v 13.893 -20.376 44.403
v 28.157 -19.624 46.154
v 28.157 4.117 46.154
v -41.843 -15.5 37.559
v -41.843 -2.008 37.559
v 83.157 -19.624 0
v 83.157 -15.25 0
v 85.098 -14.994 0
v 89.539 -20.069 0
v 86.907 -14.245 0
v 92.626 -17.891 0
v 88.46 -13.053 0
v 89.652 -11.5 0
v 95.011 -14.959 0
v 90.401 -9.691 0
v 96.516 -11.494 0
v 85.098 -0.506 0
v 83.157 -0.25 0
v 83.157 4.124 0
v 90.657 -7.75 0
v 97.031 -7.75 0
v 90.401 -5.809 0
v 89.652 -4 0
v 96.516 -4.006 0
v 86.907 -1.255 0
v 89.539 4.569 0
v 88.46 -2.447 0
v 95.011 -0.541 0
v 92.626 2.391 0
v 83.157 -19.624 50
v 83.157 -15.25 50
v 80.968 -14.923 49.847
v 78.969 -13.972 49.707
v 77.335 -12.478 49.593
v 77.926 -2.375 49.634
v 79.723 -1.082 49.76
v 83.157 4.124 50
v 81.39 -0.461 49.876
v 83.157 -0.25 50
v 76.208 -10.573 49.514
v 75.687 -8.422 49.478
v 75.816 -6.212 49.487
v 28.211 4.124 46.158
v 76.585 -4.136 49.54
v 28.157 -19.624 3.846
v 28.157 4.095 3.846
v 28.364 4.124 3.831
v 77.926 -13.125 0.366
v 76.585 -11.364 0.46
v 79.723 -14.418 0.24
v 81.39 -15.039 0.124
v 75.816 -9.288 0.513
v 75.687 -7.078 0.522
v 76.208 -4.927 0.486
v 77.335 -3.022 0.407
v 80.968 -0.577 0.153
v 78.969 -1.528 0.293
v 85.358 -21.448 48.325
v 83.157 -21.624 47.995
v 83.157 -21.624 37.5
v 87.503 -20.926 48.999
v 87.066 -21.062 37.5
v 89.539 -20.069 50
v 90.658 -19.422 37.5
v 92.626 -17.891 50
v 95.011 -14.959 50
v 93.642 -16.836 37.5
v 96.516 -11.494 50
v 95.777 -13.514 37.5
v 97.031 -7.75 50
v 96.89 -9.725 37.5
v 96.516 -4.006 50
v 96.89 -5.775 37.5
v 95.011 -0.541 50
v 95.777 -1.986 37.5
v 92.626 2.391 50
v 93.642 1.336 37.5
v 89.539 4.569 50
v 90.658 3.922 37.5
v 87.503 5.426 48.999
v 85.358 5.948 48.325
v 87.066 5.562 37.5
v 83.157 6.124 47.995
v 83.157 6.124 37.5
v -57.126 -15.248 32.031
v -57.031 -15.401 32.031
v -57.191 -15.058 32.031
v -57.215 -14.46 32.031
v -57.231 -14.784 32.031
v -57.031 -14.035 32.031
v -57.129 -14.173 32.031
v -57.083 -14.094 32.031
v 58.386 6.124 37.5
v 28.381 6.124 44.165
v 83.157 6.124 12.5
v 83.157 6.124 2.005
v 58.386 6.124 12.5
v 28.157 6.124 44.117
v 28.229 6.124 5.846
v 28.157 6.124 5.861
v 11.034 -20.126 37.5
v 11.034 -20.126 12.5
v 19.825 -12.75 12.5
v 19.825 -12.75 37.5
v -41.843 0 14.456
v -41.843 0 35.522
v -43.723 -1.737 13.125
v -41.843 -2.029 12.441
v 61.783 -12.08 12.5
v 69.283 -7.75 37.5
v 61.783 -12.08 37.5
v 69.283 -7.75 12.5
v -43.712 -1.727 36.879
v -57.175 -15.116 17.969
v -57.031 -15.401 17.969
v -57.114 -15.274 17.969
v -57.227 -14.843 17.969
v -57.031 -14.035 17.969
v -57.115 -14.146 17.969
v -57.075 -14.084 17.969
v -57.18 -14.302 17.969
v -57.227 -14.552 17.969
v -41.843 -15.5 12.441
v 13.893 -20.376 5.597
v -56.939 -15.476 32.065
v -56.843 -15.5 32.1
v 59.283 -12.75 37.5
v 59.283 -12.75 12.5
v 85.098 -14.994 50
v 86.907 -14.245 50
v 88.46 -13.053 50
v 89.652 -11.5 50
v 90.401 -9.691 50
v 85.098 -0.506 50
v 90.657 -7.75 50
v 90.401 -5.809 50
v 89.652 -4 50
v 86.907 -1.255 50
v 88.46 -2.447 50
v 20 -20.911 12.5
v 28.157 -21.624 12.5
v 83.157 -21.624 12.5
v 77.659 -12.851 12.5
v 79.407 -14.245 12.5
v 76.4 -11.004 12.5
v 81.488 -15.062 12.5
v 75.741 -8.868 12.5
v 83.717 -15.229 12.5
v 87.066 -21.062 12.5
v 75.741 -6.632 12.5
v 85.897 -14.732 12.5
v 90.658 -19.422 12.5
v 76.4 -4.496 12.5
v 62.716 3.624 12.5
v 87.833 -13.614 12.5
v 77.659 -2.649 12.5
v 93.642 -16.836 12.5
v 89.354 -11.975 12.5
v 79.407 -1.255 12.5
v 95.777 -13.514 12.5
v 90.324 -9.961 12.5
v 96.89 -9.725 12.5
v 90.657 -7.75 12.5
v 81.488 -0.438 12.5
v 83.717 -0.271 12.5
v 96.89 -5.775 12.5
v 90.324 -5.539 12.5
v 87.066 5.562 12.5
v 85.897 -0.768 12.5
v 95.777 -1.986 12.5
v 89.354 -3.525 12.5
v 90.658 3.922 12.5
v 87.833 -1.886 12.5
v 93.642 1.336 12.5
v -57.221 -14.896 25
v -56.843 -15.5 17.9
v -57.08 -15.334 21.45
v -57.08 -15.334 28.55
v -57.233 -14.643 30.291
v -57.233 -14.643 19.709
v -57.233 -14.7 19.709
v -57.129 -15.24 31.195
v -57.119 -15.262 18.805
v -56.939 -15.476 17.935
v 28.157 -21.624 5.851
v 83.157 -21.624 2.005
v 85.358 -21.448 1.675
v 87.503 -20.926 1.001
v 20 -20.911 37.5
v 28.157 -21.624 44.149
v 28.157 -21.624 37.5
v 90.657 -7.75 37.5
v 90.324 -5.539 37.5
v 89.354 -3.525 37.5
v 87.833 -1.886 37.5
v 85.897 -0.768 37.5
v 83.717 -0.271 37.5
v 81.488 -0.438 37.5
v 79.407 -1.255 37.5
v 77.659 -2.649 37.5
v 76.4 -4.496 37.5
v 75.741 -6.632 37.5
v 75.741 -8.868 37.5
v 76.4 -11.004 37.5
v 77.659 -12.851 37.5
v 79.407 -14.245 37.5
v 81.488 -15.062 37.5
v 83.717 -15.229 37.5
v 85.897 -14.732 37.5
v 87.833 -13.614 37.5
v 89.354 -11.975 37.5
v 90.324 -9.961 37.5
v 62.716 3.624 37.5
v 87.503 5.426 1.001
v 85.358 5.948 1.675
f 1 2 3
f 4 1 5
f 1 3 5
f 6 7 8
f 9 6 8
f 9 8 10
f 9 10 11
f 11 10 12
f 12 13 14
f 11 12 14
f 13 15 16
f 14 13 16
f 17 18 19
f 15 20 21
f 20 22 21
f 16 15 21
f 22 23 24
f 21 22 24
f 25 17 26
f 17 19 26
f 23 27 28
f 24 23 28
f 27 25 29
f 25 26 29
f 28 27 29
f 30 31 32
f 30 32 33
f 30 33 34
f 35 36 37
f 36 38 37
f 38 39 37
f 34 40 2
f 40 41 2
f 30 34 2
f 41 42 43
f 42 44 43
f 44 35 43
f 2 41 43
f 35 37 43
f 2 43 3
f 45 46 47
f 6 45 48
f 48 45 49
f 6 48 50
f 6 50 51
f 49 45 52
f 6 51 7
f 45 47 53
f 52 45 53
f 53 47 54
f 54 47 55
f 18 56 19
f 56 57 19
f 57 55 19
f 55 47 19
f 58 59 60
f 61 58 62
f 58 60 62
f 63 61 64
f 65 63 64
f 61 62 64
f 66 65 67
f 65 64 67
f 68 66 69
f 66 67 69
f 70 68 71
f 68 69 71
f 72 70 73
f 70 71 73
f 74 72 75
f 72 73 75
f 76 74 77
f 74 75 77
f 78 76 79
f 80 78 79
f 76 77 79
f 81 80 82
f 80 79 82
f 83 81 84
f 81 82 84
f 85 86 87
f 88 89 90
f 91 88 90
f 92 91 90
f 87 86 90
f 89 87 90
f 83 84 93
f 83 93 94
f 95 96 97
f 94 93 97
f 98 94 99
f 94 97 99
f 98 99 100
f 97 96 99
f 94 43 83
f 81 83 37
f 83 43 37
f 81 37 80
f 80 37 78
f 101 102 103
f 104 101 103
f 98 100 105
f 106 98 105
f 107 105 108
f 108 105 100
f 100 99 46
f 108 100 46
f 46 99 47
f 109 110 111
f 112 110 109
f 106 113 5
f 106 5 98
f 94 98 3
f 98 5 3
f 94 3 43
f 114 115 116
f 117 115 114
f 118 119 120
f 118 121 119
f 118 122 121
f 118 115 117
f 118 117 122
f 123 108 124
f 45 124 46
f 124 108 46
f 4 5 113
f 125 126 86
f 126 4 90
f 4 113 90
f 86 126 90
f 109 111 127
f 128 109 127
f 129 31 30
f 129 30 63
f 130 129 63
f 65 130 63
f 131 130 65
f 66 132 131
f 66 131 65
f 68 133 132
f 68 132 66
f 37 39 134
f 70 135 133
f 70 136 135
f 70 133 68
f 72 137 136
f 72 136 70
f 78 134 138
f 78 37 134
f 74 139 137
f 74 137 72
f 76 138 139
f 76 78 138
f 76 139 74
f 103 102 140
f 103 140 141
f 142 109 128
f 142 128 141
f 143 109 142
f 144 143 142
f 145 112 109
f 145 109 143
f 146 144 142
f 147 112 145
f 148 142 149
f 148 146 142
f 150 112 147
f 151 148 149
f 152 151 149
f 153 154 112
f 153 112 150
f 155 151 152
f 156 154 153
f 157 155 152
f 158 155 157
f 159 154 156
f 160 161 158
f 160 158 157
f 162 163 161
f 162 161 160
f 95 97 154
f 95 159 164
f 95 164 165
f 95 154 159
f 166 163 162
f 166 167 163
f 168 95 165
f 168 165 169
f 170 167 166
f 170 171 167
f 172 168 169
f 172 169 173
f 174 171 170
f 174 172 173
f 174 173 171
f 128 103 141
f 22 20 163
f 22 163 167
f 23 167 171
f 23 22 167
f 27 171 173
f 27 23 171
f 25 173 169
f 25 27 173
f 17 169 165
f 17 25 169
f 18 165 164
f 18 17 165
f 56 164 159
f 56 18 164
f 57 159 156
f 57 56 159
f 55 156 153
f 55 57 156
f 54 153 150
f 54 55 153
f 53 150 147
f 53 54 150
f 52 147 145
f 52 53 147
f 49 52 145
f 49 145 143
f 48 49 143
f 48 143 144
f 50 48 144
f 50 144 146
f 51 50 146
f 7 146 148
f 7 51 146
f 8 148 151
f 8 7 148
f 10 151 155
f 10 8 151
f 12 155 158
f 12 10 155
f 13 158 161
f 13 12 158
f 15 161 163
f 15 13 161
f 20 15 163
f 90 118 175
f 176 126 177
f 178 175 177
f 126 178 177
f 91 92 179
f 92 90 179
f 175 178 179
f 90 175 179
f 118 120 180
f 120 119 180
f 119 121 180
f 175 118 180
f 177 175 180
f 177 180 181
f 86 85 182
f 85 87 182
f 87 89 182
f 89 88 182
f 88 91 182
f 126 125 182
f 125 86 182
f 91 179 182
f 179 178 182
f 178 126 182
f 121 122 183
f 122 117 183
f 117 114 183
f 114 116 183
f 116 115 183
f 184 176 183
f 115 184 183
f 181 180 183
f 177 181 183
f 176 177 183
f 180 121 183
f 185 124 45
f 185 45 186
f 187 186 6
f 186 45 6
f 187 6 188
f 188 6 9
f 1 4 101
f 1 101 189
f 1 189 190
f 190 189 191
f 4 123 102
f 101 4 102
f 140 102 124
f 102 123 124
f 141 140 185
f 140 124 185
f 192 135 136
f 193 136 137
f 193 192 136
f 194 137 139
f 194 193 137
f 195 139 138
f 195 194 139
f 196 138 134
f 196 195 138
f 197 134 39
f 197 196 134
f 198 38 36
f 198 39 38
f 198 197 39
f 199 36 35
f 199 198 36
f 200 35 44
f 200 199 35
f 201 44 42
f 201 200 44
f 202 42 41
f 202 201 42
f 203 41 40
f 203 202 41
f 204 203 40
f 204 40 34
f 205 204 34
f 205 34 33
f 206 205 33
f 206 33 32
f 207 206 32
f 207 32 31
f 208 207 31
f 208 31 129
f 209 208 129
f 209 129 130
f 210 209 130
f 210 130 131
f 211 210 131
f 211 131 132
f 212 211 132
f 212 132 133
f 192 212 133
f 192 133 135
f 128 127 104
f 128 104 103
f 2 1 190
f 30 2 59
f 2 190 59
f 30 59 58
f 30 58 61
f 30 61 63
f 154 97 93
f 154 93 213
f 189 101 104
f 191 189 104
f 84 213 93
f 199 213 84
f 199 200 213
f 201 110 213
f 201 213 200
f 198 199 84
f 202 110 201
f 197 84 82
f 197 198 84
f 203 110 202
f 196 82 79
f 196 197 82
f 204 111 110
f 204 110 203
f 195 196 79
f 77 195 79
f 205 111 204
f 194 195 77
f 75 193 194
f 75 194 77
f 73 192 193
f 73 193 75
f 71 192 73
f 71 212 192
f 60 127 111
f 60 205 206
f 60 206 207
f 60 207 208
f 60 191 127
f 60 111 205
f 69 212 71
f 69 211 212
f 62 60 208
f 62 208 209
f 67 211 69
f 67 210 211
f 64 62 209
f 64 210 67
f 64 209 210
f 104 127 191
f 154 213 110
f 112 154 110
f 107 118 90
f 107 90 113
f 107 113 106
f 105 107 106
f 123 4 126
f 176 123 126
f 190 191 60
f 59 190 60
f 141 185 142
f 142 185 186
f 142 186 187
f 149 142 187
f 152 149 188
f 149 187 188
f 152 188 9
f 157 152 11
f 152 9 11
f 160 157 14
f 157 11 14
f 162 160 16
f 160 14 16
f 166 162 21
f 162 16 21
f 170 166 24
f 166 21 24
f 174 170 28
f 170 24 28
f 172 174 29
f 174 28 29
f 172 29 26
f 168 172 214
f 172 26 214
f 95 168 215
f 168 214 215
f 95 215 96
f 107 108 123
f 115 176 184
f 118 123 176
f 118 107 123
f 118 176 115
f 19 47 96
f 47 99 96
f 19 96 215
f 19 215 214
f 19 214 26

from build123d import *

# Parameters (mm, degrees)
CROQUIS1_W              = 20
CROQUIS1_H              = 27.748412894
CROQUIS1_R              = 7.5
SALIENTE_EXTRUIR1_DEPTH = 50
CORTAR_EXTRUIR4_DEPTH   = 50
CORTAR_EXTRUIR6_DEPTH   = 12.5
CHAFL_N3_START          = -1
CHAFL_N3_OUTLINE_W      = 79
CHAFL_N3_OUTLINE_H      = 9
CHAFL_N3_DEPTH          = 2.185479897
CHAFL_N4_SIZE           = 2
CHAFL_N4_SIZE_2         = 2.02158655
CHAFL_N5_START          = -33
CHAFL_N5_OUTLINE_W      = 90
CHAFL_N5_OUTLINE_H      = 7
CHAFL_N5_DEPTH          = 2.187491538
CHAFL_N6_START          = -47
CHAFL_N6_OUTLINE_W      = 78
CHAFL_N6_OUTLINE_H      = 9
CHAFL_N6_DEPTH          = 1.956109558
CHAFL_N9_START          = -12
CHAFL_N9_OUTLINE_W      = 79
CHAFL_N9_OUTLINE_H      = 9
CHAFL_N9_DEPTH          = 2.225324788
CHAFL_N10_START         = -36
CHAFL_N10_OUTLINE_W     = 65
CHAFL_N10_OUTLINE_H     = 9
CHAFL_N10_DEPTH         = 1.916264666
CROQUIS17_W             = 6
CROQUIS17_H             = 25
CORTAR_EXTRUIR8_DEPTH   = 50
CORTAR_EXTRUIR9_DEPTH   = 12.5
CORTAR_EXTRUIR10_DEPTH  = 12.5
CROQUIS22_W             = 25
CROQUIS22_H             = 11.323267037
CORTAR_EXTRUIR11_DEPTH  = 128.16446319
CROQUIS23_W             = 25
CROQUIS23_H             = 16.343664216
CORTAR_EXTRUIR12_DEPTH  = 80
CHAFL_N17_SIZE          = 9
CHAFL_N17_SIZE_2        = 8.307561118


with BuildPart() as part:
    # Croquis1 → Saliente-Extruir1 (new body)
    # profile 1 of 4: a face of its own
    with BuildSketch(Plane.XY):
        with BuildLine():
            Line((-57.030721287, -14.034703102), (-41.84315615, 0))
            Line((-41.84315615, 0), (-41.84315615, -15.5))
            Line((-41.84315615, -15.5), (-56.84315615, -15.5))
            add(Edge.make_bspline(
                [(-57.030721287, -14.034703102), (-57.299191115, -14.282793846), (-57.220648616, -14.896383781), (-57.142106118, -15.509973716), (-56.84315615, -15.5)],
                knots=[0.390549282, 0.390549282, 0.390549282, 1.766070968, 1.766070968, 3.141592654, 3.141592654, 3.141592654], degree=2, weights=[1, 0.772669387, 1, 0.772669387, 1]))
        make_face()
    # profile 2 of 4: a face of its own
    with BuildSketch(Plane.XY):
        Polygon((28.15684385, -21.624206447), (28.15684385, 6.124206447), (-41.84315615, 0), (-41.84315615, -15.5), align=None)
    # profile 3 of 4: a face of its own
    with BuildSketch(Plane.XY):
        with Locations((38.15684385, -7.75)):
            Rectangle(CROQUIS1_W, CROQUIS1_H)
    # profile 4 of 4: a face of its own
    with BuildSketch(Plane.XY):
        with BuildLine():
            Line((48.15684385, -21.624206447), (83.15684385, -21.624206447))
            ThreePointArc((83.15684385, -21.624206447), (97.031050296, -7.75), (83.15684385, 6.124206447))
            Line((83.15684385, 6.124206447), (48.15684385, 6.124206447))
            Line((48.15684385, 6.124206447), (48.15684385, -21.624206447))
        make_face()
        with Locations((83.15684385, -7.75)):
            Circle(CROQUIS1_R, mode=Mode.SUBTRACT)
    extrude(amount=SALIENTE_EXTRUIR1_DEPTH)

    # Croquis6 → Cortar-Extruir4 (cut)
    with BuildSketch(Plane(origin=(0, 6.124206447, 0), x_dir=(1, 0, 0), z_dir=(0, 1, 0))):
        Polygon((83.15684385, 0), (28.15684385, 0), (28.15684385, -3.845974657), align=None)
        Polygon((83.15684385, -50), (28.15684385, -46.154025343), (28.15684385, -50), align=None)
        Polygon((28.15684385, -50), (28.15684385, -46.154025343), (-41.84315615, -37.55910608), (-41.84315615, -50), align=None)
        Polygon((28.15684385, -3.845974657), (28.15684385, 0), (-41.84315615, 0), (-41.84315615, -12.44089392), align=None)
        Polygon((-57.233399119, 0), (-41.84315615, 0), (-41.84315615, -12.44089392), (-57.030721287, -17.968715561), (-57.233399119, -17.968715561), align=None)
        Polygon((-57.233399119, -32.031284439), (-57.233399119, -50), (-41.84315615, -50), (-41.84315615, -37.55910608), (-57.030721287, -32.031284439), align=None)
    extrude(amount=-CORTAR_EXTRUIR4_DEPTH, mode=Mode.SUBTRACT)

    # Croquis10 → Cortar-Extruir6 (cut, symmetric)
    with BuildSketch(Plane.XY.offset(25)):
        with BuildLine():
            Line((83.15684385, 6.124206447), (75.731562774, 6.124206447))
            Line((75.731562774, 6.124206447), (75.731562774, 3.970017299))
            ThreePointArc((75.731562774, 3.970017299), (69.289041207, -8.171490688), (76.457035077, -19.899327839))
            Line((76.457035077, -19.899327839), (76.457035077, -21.624206447))
            Line((76.457035077, -21.624206447), (83.15684385, -21.624206447))
            ThreePointArc((83.15684385, -21.624206447), (97.031050296, -7.75), (83.15684385, 6.124206447))
        make_face()
    extrude(amount=CORTAR_EXTRUIR6_DEPTH, both=True, mode=Mode.SUBTRACT)

    # Chaflán3: read off the stored shape, not the designer's step
    # Chaflán3 outline → Chaflán3 (cut)
    with BuildSketch(Plane(origin=(0, 0, 0), x_dir=(0.9987827677655402, 0.0349207435267313, -0.034835678350610806), z_dir=(0.04932527561612769, -0.7071067811865458, 0.7053843046066418)).offset(CHAFL_N3_START)):
        with Locations((51.5, 5.5)):
            Rectangle(CHAFL_N3_OUTLINE_W, CHAFL_N3_OUTLINE_H)
    extrude(amount=CHAFL_N3_DEPTH, mode=Mode.SUBTRACT)

    # Chaflán4
    # the kernel refuses this chamfer: 2.02158655, 2 mm, written as the material it takes off along each edge
    with BuildSketch(Plane(origin=(29.320006018, 6.22596995, 3.703156301), x_dir=(0.1209504317481252, 0.010581791626527273, 0.9926021452454729), z_dir=(-0.9888249944080325, -0.08651097722179166, 0.1214124427482008))) as chafl_n4_piece_1:
        Polygon((CHAFL_N4_SIZE, 0), (-CHAFL_N4_SIZE_2 * 0.0106216131418, -CHAFL_N4_SIZE_2 * 0.999943588993), (0, 0), align=None)
    extrude(amount=87.568441366, mode=Mode.SUBTRACT)

    # Chaflán5: read off the stored shape, not the designer's step
    # Chaflán5 outline → Chaflán5 (cut)
    with BuildSketch(Plane(origin=(0, 0, 0), x_dir=(0.9891526601001411, 0.10461310355007251, 0.1031169897855652), z_dir=(0.14689116725254298, -0.7044557654033778, -0.6943810622224129)).offset(CHAFL_N5_START)):
        with Locations((4, 27.5)):
            Rectangle(CHAFL_N5_OUTLINE_W, CHAFL_N5_OUTLINE_H)
    extrude(amount=CHAFL_N5_DEPTH, mode=Mode.SUBTRACT)

    # Chaflán6: read off the stored shape, not the designer's step
    # Chaflán6 outline → Chaflán6 (cut)
    with BuildSketch(Plane(origin=(0, 0, 0), x_dir=(0.9987827677655402, -0.034920743526731114, 0.03483567835061047), z_dir=(0.04932527561612732, 0.7071067811865474, -0.7053843046066404)).offset(CHAFL_N6_START)):
        with Locations((54, -18.5)):
            Rectangle(CHAFL_N6_OUTLINE_W, CHAFL_N6_OUTLINE_H)
    extrude(amount=CHAFL_N6_DEPTH, mode=Mode.SUBTRACT)

    # Chaflán9: read off the stored shape, not the designer's step
    # Chaflán9 outline → Chaflán9 (cut)
    with BuildSketch(Plane(origin=(0, 0, 0), x_dir=(0.9987827677655402, -0.03492074352673121, -0.03483567835061067), z_dir=(0.049325275616127526, 0.7071067811865464, 0.7053843046066414)).offset(CHAFL_N9_START)):
        with Locations((52.5, -16.5)):
            Rectangle(CHAFL_N9_OUTLINE_W, CHAFL_N9_OUTLINE_H)
    extrude(amount=CHAFL_N9_DEPTH, mode=Mode.SUBTRACT)

    # Chaflán10: read off the stored shape, not the designer's step
    # Chaflán10 outline → Chaflán10 (cut)
    with BuildSketch(Plane(origin=(0, 0, 0), x_dir=(0.9987827677655402, 0.03492074352673113, 0.034835678350610584), z_dir=(0.049325275616127415, -0.7071067811865462, -0.7053843046066413)).offset(CHAFL_N10_START)):
        with Locations((60.5, 29.5)):
            Rectangle(CHAFL_N10_OUTLINE_W, CHAFL_N10_OUTLINE_H)
    extrude(amount=CHAFL_N10_DEPTH, mode=Mode.SUBTRACT)

    # Croquis17 → Cortar-Extruir8 (cut, symmetric)
    with BuildSketch(Plane(origin=(0, 0, 0), x_dir=(1, 0, 0), z_dir=(0, 1, 0))):
        with Locations((76.444203312, -25)):
            Rectangle(CROQUIS17_W, CROQUIS17_H)
    extrude(amount=CORTAR_EXTRUIR8_DEPTH, both=True, mode=Mode.SUBTRACT)

    # Croquis19 → Cortar-Extruir9 (cut, symmetric)
    with BuildSketch(Plane.XY.offset(25)):
        Polygon((83.15684385, 6.124206447), (83.15684385, -7.75), (63.342423567, 6.124206447), align=None)
        Polygon((63.342423567, -21.624206447), (83.15684385, -7.75), (83.15684385, -21.624206447), align=None)
    extrude(amount=CORTAR_EXTRUIR9_DEPTH, both=True, mode=Mode.SUBTRACT)

    # Croquis20 → Cortar-Extruir10 (cut, symmetric)
    with BuildSketch(Plane.XY.offset(25)):
        with BuildLine():
            Line((61.272360576, 6.124206447), (69.282637403, -7.75))
            ThreePointArc((69.282637403, -7.75), (73.346298387, 2.060545462), (83.15684385, 6.124206447))
            Line((83.15684385, 6.124206447), (61.272360576, 6.124206447))
        make_face()
        with BuildLine():
            ThreePointArc((83.15684385, -21.624206447), (73.346298387, -17.560545462), (69.282637403, -7.75))
            Line((69.282637403, -7.75), (61.272360576, -21.624206447))
            Line((61.272360576, -21.624206447), (83.15684385, -21.624206447))
        make_face()
    extrude(amount=CORTAR_EXTRUIR10_DEPTH, both=True, mode=Mode.SUBTRACT)

    # Croquis22 → Cortar-Extruir11 (cut, through all)
    with BuildSketch(Plane(origin=(48.606129612, 28.062762016, 0), x_dir=(0, 0, -1), z_dir=(0.866025403784436, 0.5000000000000046, 0))):
        with Locations((-25, -47.0146491)):
            Rectangle(CROQUIS22_W, CROQUIS22_H)
    extrude(amount=-CORTAR_EXTRUIR11_DEPTH, mode=Mode.SUBTRACT)

    # Croquis23 → Cortar-Extruir12 (cut)
    with BuildSketch(Plane(origin=(100, 0, 0), x_dir=(0, 0, -1), z_dir=(1, 0, 0))):
        with Locations((-25, -20.921832108)):
            Rectangle(CROQUIS23_W, CROQUIS23_H)
    extrude(amount=-CORTAR_EXTRUIR12_DEPTH, mode=Mode.SUBTRACT)

    # Chaflán14
    # the kernel refuses this chamfer: 5 mm, written as the material it takes off along each edge
    with BuildSketch(Plane(origin=(60.622383365, -12.75, 37.5), x_dir=(0.8660254037844363, 0.5000000000000041, 0), z_dir=(0, 0, -1))) as chafl_n14_piece_1:
        with BuildLine():
            Line((1.532931127, 0.051763809), (-1.353439203, -0.72163679))
            Line((-1.353439203, -0.72163679), (-1.403439203, -0.63503425))
            ThreePointArc((-1.403439203, -0.63503425), (-0.713778649, -0.296630241), (-0.05, 0.08660254))
            Line((-0.05, 0.08660254), (0, 0.1))
            ThreePointArc((0, 0.1), (0.766465564, 0.1), (1.532931127, 0.151763809))
            Line((1.532931127, 0.151763809), (1.532931127, 0.051763809))
        make_face()
    extrude(amount=25, mode=Mode.SUBTRACT)

    # Chaflán15
    # the kernel refuses this chamfer: 5 mm, written as the material it takes off along each edge
    with BuildSketch(Plane(origin=(61.272360576, 6.124206447, 12.5), x_dir=(-1, 0, 0), z_dir=(0, 0, 1))) as chafl_n15_piece_1:
        with BuildLine():
            Line((3.059956427, -0.1), (-1.616580754, 2.6))
            Line((-1.616580754, 2.6), (-1.703183294, 2.55))
            ThreePointArc((-1.703183294, 2.55), (-0.851591647, 1.275), (-0.08660254, -0.05))
            Line((-0.08660254, -0.05), (0, -0.1))
            ThreePointArc((0, -0.1), (1.529978213, -0.1), (3.059956427, -0.2))
            Line((3.059956427, -0.2), (3.059956427, -0.1))
        make_face()
    extrude(amount=25, mode=Mode.SUBTRACT)

    # Chaflán17
    # the kernel refuses this chamfer: 9, 8.307561118 mm, written as the material it takes off along each edge
    with BuildSketch(Plane(origin=(20, -20.91057508, 12.5), x_dir=(-0.9961946980917451, 0.08715574274766211, 0), z_dir=(0, 0, 1))) as chafl_n17_piece_1_section:
        Polygon((CHAFL_N17_SIZE, 0), (CHAFL_N17_SIZE_2 * 0.0871557427526, -CHAFL_N17_SIZE_2 * 0.996194698149), (0, 0), align=None)
    chafl_n17_piece_1 = extrude(amount=25, mode=Mode.PRIVATE)
    chafl_n17_piece_1 = split(chafl_n17_piece_1, bisect_by=Plane(origin=(20, -12.75, 12.5), z_dir=(0, -1, 0)), keep=Keep.TOP, mode=Mode.PRIVATE)
    add(chafl_n17_piece_1, mode=Mode.SUBTRACT)


solid = part.part
